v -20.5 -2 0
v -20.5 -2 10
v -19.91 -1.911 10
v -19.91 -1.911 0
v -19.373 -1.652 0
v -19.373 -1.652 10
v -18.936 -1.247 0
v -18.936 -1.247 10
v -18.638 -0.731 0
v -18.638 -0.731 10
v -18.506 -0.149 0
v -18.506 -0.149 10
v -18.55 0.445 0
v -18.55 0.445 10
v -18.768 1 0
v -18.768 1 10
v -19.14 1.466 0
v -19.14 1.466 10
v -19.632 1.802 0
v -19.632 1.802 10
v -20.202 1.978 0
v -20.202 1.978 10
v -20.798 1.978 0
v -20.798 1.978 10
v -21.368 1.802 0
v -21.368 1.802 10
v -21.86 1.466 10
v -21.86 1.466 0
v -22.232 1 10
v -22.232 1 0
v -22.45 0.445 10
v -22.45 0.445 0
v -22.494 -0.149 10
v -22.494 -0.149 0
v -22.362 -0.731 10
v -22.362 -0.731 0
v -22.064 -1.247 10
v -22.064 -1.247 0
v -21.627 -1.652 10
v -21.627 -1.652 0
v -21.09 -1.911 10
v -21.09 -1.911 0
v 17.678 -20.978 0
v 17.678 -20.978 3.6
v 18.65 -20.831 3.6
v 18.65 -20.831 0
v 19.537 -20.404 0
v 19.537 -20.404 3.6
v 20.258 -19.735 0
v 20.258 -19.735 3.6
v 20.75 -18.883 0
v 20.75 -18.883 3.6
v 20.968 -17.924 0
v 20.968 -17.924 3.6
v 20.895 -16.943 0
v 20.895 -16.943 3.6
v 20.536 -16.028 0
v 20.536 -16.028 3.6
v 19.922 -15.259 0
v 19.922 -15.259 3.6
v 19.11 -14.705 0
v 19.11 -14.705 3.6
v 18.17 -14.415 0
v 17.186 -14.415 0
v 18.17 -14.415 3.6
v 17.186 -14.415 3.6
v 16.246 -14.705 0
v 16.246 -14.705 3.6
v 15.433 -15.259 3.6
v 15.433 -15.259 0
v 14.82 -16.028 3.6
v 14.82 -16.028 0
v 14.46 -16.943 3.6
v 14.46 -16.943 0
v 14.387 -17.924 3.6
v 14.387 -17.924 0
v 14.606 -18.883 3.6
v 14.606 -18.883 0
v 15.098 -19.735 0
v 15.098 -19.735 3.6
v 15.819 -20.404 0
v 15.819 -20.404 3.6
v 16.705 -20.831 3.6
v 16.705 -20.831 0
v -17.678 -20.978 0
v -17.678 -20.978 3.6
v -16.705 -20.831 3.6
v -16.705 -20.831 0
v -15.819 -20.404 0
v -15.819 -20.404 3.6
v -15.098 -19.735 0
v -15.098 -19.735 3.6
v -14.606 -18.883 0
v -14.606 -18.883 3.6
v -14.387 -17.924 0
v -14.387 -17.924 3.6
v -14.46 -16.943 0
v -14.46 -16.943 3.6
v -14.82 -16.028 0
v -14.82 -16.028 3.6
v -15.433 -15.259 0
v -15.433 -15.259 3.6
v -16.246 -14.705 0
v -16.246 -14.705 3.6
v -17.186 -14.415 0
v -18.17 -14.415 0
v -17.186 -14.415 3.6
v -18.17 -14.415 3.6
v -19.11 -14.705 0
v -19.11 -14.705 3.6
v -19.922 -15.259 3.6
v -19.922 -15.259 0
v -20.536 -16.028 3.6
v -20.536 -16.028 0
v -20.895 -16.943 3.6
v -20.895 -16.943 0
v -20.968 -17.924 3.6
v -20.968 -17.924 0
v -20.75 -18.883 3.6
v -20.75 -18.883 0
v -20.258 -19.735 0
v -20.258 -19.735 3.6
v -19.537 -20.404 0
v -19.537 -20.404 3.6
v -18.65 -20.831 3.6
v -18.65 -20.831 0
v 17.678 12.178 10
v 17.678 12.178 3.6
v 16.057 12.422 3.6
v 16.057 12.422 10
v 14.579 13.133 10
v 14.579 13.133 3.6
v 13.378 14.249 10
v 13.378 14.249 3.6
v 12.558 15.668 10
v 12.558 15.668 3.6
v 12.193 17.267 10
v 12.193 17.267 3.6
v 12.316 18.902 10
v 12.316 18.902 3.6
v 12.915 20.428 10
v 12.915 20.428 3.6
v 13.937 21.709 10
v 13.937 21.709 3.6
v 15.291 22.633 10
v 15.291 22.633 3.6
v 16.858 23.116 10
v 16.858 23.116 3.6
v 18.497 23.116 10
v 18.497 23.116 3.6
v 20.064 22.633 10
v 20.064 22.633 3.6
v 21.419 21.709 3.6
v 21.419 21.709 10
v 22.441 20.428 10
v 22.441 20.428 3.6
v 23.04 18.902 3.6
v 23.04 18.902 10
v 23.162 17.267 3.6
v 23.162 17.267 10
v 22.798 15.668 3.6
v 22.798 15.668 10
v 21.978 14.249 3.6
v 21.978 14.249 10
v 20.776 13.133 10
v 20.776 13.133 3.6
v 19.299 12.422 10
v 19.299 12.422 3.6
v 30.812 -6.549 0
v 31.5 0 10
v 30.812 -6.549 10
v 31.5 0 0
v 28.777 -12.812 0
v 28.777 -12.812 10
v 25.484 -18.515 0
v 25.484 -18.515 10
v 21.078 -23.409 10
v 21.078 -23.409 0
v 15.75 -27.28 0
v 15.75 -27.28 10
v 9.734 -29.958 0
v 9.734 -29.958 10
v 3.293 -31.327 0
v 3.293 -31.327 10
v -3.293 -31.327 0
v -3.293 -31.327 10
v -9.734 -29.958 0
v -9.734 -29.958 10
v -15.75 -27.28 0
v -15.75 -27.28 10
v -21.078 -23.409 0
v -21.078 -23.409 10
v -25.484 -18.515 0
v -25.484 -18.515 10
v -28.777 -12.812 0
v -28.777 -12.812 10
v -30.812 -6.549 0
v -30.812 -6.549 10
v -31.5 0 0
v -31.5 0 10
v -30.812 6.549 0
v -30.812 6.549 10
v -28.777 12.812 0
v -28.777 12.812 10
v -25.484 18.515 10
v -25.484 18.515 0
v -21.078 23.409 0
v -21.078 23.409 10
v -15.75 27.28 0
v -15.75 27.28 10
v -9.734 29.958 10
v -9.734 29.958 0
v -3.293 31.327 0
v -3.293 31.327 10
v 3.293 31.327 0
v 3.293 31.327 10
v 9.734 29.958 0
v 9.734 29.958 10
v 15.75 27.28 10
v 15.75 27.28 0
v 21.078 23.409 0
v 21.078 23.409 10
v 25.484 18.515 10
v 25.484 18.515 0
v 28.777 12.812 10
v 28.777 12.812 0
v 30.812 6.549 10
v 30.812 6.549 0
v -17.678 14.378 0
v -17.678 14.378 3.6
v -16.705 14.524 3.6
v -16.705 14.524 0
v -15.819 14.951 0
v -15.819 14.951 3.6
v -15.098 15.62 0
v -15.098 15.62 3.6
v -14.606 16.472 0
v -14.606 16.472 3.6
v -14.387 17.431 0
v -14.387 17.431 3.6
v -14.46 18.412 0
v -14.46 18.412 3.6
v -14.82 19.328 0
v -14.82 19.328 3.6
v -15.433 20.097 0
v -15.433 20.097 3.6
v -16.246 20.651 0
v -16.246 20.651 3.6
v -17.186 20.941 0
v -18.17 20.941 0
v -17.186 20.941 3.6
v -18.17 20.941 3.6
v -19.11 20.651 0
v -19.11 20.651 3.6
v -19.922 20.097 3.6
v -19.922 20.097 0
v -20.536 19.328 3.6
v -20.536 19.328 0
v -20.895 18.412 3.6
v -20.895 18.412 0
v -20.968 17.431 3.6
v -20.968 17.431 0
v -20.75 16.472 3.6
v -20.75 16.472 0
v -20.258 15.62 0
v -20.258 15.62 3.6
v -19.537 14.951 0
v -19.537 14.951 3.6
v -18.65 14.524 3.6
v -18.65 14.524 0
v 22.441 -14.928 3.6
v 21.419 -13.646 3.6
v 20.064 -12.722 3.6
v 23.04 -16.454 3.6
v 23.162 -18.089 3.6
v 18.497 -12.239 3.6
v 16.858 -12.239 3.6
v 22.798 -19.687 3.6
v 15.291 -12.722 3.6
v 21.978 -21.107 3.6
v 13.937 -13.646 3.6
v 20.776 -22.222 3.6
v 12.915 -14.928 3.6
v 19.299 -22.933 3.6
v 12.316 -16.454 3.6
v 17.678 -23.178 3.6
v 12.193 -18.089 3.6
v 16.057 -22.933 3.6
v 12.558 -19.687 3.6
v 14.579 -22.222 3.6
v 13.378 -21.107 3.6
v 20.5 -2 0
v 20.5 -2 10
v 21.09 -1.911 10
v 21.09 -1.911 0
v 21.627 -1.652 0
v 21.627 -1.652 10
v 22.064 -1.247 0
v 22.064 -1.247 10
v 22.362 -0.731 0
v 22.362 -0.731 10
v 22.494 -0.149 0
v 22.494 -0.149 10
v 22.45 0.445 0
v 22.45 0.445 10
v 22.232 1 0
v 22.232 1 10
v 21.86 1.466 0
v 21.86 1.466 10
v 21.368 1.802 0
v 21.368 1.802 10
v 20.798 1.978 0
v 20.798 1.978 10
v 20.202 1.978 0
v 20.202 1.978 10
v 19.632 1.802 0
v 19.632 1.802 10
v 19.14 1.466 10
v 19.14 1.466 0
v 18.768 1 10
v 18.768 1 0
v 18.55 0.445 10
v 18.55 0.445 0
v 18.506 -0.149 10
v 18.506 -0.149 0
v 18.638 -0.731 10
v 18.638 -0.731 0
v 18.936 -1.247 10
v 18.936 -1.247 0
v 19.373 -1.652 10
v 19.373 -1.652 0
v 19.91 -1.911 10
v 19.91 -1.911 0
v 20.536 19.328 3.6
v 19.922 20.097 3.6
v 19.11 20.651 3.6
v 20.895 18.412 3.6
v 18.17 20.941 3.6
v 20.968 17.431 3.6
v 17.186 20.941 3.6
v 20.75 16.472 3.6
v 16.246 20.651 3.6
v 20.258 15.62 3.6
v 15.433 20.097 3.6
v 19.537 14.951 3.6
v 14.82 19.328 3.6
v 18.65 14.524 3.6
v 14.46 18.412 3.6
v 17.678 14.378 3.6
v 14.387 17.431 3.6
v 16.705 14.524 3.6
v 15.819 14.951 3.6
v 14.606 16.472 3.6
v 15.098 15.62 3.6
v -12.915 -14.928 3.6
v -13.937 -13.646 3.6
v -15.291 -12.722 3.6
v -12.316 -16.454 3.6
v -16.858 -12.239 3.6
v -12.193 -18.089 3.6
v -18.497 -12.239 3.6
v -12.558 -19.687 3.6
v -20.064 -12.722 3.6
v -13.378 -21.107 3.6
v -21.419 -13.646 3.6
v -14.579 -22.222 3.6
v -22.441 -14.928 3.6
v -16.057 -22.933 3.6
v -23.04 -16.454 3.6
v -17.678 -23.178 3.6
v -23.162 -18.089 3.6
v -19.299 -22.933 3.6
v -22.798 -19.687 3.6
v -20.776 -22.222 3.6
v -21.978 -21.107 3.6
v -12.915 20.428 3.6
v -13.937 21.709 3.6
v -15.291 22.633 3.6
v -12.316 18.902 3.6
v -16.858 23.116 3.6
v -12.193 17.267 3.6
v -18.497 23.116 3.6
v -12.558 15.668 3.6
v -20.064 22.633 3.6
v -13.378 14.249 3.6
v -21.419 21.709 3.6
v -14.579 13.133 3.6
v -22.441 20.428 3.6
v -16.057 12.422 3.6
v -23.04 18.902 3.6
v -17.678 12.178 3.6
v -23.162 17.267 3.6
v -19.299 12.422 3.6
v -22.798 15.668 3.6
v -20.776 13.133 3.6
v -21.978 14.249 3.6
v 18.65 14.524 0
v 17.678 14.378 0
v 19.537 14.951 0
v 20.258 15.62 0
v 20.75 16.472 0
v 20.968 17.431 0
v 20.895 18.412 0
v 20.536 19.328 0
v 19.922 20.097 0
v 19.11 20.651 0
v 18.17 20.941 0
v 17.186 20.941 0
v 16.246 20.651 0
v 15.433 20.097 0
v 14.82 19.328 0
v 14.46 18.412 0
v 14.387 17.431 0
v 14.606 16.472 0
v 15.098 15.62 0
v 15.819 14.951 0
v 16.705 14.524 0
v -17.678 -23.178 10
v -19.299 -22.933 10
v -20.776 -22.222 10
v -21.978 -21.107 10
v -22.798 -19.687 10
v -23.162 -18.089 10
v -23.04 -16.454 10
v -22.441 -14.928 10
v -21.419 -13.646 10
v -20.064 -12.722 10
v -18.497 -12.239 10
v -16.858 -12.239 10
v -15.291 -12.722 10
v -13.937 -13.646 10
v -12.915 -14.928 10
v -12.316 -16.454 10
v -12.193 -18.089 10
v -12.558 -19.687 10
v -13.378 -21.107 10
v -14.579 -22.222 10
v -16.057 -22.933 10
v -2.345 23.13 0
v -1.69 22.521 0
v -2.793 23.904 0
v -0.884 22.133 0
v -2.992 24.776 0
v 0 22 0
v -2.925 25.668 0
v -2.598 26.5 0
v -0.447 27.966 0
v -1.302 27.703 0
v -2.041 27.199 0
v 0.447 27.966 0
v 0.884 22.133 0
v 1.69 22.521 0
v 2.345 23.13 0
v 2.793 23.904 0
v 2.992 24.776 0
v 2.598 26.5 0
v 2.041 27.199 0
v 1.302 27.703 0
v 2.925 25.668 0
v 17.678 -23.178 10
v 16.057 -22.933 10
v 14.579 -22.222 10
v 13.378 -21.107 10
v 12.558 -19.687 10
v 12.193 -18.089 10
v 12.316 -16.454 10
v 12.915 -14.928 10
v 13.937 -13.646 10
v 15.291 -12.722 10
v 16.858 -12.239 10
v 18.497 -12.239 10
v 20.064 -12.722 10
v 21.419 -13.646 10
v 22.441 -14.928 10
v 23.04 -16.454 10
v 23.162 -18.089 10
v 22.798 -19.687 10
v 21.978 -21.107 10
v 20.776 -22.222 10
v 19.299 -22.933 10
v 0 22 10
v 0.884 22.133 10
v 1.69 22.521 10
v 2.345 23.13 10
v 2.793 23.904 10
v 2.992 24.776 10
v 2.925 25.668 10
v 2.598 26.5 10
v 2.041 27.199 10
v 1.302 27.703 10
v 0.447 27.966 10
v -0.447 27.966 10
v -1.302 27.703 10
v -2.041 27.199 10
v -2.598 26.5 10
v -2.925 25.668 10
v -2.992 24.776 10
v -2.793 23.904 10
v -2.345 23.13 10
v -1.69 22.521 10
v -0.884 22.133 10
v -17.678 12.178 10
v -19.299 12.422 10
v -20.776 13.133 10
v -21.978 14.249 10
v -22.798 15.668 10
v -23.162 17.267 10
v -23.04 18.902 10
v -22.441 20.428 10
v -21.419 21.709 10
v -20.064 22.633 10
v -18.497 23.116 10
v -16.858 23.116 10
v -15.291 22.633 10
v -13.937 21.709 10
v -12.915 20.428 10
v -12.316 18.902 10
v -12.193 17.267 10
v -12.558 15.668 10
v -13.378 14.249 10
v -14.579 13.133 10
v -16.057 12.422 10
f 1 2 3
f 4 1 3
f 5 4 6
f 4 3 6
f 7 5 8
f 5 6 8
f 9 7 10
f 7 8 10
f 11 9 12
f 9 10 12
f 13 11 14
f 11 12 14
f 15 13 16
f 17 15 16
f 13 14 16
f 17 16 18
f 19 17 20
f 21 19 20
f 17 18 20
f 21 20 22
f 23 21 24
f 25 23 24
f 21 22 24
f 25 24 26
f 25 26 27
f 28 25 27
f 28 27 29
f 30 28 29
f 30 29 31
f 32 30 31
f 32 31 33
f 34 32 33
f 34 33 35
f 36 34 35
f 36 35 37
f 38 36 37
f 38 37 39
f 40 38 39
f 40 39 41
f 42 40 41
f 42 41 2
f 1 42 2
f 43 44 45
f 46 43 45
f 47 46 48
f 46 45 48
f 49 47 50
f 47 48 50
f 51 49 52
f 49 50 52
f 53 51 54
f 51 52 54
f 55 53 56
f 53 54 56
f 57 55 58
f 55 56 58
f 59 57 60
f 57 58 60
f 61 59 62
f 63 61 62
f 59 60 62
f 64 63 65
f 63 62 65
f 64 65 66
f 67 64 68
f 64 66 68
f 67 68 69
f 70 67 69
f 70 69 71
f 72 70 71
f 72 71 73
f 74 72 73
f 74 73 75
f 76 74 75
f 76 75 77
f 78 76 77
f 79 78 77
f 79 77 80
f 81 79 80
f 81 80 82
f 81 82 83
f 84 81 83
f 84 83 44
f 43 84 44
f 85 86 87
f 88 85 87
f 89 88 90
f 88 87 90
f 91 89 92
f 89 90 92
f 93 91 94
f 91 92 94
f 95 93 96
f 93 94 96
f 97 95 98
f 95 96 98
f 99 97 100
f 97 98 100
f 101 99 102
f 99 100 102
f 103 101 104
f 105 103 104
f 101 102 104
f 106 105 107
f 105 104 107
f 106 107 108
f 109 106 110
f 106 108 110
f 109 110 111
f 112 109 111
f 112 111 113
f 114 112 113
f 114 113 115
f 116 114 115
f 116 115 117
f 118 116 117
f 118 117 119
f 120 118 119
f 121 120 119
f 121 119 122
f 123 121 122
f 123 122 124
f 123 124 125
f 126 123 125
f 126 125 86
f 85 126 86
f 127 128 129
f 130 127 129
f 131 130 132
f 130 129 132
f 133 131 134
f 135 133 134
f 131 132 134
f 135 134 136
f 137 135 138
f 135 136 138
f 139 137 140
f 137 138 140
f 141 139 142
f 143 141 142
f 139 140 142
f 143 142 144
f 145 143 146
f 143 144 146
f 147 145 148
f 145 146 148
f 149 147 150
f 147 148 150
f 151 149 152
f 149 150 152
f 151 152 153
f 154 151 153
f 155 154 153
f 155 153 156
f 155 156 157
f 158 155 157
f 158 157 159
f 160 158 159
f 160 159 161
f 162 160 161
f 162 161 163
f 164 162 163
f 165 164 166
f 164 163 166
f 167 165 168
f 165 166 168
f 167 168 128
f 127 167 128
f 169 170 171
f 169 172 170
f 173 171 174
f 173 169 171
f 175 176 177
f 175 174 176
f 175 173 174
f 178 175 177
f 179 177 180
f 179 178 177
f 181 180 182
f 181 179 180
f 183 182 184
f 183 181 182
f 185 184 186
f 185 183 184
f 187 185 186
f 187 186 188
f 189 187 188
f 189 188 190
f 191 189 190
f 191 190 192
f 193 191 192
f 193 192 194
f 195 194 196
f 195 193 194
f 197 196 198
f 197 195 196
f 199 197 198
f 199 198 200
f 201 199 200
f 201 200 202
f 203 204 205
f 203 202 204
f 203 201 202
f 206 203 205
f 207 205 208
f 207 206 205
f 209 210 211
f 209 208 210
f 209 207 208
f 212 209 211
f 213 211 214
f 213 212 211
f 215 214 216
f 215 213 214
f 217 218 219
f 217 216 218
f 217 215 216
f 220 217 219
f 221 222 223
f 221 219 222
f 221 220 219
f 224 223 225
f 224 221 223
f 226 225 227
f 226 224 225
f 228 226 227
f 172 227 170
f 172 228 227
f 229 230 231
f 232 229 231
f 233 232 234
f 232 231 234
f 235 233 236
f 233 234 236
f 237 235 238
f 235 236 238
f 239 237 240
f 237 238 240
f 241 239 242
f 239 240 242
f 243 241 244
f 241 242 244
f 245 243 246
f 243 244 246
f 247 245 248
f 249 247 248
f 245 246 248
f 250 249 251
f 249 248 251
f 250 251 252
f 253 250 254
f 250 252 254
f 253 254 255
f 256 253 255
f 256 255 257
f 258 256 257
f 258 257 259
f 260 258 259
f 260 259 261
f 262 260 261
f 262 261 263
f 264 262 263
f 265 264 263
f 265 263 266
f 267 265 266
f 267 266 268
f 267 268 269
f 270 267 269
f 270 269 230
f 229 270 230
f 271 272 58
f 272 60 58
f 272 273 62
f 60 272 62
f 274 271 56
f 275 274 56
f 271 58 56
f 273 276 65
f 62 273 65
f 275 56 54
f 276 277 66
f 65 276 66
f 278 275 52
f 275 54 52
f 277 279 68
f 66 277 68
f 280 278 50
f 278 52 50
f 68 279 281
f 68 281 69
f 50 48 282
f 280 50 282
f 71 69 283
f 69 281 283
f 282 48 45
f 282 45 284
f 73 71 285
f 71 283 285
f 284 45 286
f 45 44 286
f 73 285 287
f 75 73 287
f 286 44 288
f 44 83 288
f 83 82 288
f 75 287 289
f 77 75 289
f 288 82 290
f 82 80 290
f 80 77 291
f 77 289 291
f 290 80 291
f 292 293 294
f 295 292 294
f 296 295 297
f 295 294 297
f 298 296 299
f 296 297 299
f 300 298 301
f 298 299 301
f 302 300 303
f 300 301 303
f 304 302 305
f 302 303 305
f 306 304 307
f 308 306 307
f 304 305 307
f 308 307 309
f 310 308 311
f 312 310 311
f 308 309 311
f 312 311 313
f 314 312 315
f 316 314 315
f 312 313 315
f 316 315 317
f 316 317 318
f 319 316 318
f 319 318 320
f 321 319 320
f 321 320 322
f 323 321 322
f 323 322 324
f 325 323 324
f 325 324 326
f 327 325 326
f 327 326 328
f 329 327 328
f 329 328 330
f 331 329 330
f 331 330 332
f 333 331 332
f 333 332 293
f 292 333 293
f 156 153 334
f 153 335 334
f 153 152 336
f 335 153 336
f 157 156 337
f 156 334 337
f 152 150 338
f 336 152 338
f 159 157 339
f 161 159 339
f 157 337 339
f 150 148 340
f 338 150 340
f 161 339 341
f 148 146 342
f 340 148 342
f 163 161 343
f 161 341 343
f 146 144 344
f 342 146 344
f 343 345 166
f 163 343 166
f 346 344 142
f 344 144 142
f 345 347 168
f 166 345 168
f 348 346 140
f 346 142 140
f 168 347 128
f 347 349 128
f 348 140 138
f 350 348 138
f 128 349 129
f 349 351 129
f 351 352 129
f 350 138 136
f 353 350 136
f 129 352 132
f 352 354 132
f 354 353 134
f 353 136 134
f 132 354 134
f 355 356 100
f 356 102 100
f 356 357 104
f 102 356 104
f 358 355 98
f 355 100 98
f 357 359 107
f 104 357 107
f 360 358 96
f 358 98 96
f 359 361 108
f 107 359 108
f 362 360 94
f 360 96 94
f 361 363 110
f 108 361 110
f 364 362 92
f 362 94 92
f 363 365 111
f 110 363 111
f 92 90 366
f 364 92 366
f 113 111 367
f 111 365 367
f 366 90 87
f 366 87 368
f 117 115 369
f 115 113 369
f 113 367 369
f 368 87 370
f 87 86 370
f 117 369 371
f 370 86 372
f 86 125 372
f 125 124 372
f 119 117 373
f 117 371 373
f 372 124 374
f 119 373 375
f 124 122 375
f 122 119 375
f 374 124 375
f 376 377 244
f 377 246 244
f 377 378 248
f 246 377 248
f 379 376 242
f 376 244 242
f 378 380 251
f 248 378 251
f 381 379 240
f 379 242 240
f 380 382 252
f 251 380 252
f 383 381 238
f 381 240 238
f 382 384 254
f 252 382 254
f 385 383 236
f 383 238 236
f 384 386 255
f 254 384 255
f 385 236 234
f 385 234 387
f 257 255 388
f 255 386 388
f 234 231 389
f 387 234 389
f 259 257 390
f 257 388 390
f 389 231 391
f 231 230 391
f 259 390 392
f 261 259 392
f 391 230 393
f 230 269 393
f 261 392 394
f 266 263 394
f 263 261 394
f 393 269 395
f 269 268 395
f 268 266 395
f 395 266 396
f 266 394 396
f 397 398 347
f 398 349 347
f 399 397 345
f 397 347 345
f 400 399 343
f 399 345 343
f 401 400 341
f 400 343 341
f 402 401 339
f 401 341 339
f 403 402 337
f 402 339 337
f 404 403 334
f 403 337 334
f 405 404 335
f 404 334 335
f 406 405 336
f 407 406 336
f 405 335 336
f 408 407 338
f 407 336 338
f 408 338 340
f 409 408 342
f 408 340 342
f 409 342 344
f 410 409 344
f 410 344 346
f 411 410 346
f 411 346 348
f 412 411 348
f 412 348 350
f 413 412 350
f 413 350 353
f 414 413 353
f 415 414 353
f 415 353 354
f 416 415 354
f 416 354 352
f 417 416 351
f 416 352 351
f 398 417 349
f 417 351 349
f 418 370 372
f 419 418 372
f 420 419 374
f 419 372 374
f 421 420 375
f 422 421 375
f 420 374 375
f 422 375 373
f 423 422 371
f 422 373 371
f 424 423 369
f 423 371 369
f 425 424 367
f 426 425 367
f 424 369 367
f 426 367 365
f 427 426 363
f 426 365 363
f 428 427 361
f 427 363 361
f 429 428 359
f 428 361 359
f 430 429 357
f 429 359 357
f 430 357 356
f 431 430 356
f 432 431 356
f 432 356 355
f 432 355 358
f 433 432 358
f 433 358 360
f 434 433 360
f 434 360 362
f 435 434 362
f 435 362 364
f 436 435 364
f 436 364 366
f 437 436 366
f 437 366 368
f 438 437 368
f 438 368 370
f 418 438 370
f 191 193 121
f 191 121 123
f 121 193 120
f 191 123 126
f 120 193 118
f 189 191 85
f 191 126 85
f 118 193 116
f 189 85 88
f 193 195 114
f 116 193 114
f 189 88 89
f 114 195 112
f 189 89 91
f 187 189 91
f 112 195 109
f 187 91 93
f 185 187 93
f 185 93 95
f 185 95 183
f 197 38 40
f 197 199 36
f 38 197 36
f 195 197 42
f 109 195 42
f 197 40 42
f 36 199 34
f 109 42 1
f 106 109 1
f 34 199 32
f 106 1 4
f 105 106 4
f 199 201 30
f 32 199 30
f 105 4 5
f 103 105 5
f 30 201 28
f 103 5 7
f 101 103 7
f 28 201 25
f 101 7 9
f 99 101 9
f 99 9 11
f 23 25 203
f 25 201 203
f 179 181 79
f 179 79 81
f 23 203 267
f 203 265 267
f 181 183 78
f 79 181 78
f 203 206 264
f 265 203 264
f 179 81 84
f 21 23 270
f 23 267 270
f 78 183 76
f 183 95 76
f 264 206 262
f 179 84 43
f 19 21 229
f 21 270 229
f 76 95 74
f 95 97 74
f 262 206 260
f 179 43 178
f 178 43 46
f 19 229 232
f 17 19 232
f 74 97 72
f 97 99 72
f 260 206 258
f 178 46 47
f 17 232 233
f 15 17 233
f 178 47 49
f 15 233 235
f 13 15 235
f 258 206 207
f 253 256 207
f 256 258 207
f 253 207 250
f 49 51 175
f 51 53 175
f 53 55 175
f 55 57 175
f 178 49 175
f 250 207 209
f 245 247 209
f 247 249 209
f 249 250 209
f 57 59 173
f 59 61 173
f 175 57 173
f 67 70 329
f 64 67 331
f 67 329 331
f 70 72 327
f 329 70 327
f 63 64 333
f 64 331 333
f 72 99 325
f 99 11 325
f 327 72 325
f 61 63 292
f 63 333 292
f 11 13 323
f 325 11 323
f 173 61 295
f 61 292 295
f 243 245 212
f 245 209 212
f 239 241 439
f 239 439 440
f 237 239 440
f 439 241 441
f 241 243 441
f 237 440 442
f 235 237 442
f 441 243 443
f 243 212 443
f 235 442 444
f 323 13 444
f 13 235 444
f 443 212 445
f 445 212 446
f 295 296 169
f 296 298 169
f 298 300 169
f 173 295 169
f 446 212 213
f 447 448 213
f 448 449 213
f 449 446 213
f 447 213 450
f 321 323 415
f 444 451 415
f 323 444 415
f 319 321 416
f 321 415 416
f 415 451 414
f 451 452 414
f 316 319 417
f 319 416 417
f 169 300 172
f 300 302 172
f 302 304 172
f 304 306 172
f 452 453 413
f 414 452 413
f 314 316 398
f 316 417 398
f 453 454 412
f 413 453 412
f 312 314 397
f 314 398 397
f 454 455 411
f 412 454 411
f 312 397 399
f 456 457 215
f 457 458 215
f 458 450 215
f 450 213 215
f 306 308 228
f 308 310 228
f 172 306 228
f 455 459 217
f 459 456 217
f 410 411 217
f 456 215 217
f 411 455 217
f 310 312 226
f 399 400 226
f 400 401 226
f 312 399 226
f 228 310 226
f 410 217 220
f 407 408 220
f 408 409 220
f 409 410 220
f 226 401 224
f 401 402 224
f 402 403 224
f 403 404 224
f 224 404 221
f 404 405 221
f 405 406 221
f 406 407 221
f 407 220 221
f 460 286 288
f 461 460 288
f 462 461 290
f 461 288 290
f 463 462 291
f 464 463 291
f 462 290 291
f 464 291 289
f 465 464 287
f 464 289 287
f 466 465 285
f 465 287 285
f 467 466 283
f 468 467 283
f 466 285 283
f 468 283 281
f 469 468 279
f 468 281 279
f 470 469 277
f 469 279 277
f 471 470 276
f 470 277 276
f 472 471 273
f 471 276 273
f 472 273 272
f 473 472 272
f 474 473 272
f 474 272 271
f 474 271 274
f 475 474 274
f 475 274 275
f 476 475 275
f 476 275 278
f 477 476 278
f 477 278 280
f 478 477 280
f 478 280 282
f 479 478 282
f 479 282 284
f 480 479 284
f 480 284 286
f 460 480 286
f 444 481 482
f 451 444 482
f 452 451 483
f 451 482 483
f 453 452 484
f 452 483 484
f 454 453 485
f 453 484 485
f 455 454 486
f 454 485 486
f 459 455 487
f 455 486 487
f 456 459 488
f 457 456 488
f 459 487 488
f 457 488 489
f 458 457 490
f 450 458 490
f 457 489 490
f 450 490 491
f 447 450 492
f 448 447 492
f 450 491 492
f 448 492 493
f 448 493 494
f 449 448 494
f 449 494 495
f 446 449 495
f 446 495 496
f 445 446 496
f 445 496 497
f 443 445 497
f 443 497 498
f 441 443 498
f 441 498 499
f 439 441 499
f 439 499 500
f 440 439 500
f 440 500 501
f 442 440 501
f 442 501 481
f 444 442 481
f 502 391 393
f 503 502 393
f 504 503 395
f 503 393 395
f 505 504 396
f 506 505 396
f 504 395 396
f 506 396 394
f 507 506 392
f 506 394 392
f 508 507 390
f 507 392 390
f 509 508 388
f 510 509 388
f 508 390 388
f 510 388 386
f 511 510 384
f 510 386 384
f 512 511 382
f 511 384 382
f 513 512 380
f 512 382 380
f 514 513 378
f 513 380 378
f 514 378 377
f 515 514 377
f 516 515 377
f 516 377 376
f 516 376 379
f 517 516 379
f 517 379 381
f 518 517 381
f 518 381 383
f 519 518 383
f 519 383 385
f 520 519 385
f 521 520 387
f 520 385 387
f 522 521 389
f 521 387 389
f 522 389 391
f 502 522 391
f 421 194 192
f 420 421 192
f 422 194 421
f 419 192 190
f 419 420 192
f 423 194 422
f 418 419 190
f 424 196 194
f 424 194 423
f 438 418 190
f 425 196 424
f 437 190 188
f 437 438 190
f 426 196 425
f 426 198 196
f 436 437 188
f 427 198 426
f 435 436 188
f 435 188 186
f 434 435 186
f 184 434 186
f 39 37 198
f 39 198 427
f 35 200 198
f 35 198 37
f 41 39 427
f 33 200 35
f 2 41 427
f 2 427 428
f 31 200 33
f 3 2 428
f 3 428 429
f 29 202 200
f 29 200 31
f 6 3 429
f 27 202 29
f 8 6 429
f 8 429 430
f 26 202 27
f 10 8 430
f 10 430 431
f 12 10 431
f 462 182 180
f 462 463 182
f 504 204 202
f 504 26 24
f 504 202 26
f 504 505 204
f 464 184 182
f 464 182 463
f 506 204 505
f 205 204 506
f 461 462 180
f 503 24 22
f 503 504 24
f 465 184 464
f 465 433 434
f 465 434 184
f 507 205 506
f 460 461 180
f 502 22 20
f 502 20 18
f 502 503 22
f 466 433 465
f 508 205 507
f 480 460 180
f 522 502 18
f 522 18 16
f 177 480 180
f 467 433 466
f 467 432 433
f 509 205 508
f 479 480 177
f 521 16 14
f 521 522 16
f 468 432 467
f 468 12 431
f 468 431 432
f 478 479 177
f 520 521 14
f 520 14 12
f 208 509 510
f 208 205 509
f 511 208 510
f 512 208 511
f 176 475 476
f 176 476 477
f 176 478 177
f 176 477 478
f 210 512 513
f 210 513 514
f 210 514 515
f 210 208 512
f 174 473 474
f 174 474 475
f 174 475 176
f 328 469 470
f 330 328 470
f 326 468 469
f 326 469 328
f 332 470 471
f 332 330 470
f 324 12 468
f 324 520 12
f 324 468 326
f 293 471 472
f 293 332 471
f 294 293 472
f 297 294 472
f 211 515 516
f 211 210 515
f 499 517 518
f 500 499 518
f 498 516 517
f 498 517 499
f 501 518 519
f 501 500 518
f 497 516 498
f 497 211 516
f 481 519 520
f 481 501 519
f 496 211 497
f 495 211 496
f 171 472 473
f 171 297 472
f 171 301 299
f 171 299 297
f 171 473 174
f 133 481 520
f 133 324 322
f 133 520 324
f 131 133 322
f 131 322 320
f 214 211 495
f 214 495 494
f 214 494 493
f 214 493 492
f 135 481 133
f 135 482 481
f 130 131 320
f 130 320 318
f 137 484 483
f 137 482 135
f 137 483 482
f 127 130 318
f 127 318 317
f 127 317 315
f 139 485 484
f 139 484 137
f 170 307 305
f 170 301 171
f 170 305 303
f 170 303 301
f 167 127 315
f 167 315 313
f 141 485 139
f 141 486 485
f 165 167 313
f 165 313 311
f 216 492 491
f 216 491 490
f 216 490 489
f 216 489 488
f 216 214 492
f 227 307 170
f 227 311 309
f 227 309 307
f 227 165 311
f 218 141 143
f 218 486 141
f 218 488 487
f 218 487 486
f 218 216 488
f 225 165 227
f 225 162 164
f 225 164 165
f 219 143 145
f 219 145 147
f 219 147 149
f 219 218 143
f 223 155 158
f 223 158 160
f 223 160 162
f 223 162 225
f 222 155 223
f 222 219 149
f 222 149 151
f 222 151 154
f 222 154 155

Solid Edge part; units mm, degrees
sketch "Sketch1" plane through (0, 0, 0) normal (0, 0, 1) x (1, 0, 0)
  circle A0 centre (0, 0) radius 31.5
extrude "Protrusion1" add sketch "Sketch1" along normal blind 10
hole "Hole_1" at (-17.6777, 17.6777, 10) direction (0, 0, -1) diameter 6.6 end up to next counterbore diameter 11 counterbore depth 6.4
hole "Hole1" at (17.6777, 17.6777, 10) direction (0, 0, -1) diameter 6.6 end up to next counterbore diameter 11 counterbore depth 6.4
hole "Hole2" at (-17.6777, -17.6777, 10) direction (0, 0, -1) diameter 6.6 end up to next counterbore diameter 11 counterbore depth 6.4
hole "Hole3" at (17.6777, -17.6777, 10) direction (0, 0, -1) diameter 6.6 end up to next counterbore diameter 11 counterbore depth 6.4
hole "Hole4" at (0, 25, 10) direction (0, 0, -1) diameter 6 end up to next
hole "Hole_6" at (-20.5, 0, 10) direction (0, 0, -1) diameter 4 end up to next thread major 4 thread length 2
hole "Hole5" at (20.5, 0, 10) direction (0, 0, -1) diameter 4 end up to next thread major 4 thread length 2
